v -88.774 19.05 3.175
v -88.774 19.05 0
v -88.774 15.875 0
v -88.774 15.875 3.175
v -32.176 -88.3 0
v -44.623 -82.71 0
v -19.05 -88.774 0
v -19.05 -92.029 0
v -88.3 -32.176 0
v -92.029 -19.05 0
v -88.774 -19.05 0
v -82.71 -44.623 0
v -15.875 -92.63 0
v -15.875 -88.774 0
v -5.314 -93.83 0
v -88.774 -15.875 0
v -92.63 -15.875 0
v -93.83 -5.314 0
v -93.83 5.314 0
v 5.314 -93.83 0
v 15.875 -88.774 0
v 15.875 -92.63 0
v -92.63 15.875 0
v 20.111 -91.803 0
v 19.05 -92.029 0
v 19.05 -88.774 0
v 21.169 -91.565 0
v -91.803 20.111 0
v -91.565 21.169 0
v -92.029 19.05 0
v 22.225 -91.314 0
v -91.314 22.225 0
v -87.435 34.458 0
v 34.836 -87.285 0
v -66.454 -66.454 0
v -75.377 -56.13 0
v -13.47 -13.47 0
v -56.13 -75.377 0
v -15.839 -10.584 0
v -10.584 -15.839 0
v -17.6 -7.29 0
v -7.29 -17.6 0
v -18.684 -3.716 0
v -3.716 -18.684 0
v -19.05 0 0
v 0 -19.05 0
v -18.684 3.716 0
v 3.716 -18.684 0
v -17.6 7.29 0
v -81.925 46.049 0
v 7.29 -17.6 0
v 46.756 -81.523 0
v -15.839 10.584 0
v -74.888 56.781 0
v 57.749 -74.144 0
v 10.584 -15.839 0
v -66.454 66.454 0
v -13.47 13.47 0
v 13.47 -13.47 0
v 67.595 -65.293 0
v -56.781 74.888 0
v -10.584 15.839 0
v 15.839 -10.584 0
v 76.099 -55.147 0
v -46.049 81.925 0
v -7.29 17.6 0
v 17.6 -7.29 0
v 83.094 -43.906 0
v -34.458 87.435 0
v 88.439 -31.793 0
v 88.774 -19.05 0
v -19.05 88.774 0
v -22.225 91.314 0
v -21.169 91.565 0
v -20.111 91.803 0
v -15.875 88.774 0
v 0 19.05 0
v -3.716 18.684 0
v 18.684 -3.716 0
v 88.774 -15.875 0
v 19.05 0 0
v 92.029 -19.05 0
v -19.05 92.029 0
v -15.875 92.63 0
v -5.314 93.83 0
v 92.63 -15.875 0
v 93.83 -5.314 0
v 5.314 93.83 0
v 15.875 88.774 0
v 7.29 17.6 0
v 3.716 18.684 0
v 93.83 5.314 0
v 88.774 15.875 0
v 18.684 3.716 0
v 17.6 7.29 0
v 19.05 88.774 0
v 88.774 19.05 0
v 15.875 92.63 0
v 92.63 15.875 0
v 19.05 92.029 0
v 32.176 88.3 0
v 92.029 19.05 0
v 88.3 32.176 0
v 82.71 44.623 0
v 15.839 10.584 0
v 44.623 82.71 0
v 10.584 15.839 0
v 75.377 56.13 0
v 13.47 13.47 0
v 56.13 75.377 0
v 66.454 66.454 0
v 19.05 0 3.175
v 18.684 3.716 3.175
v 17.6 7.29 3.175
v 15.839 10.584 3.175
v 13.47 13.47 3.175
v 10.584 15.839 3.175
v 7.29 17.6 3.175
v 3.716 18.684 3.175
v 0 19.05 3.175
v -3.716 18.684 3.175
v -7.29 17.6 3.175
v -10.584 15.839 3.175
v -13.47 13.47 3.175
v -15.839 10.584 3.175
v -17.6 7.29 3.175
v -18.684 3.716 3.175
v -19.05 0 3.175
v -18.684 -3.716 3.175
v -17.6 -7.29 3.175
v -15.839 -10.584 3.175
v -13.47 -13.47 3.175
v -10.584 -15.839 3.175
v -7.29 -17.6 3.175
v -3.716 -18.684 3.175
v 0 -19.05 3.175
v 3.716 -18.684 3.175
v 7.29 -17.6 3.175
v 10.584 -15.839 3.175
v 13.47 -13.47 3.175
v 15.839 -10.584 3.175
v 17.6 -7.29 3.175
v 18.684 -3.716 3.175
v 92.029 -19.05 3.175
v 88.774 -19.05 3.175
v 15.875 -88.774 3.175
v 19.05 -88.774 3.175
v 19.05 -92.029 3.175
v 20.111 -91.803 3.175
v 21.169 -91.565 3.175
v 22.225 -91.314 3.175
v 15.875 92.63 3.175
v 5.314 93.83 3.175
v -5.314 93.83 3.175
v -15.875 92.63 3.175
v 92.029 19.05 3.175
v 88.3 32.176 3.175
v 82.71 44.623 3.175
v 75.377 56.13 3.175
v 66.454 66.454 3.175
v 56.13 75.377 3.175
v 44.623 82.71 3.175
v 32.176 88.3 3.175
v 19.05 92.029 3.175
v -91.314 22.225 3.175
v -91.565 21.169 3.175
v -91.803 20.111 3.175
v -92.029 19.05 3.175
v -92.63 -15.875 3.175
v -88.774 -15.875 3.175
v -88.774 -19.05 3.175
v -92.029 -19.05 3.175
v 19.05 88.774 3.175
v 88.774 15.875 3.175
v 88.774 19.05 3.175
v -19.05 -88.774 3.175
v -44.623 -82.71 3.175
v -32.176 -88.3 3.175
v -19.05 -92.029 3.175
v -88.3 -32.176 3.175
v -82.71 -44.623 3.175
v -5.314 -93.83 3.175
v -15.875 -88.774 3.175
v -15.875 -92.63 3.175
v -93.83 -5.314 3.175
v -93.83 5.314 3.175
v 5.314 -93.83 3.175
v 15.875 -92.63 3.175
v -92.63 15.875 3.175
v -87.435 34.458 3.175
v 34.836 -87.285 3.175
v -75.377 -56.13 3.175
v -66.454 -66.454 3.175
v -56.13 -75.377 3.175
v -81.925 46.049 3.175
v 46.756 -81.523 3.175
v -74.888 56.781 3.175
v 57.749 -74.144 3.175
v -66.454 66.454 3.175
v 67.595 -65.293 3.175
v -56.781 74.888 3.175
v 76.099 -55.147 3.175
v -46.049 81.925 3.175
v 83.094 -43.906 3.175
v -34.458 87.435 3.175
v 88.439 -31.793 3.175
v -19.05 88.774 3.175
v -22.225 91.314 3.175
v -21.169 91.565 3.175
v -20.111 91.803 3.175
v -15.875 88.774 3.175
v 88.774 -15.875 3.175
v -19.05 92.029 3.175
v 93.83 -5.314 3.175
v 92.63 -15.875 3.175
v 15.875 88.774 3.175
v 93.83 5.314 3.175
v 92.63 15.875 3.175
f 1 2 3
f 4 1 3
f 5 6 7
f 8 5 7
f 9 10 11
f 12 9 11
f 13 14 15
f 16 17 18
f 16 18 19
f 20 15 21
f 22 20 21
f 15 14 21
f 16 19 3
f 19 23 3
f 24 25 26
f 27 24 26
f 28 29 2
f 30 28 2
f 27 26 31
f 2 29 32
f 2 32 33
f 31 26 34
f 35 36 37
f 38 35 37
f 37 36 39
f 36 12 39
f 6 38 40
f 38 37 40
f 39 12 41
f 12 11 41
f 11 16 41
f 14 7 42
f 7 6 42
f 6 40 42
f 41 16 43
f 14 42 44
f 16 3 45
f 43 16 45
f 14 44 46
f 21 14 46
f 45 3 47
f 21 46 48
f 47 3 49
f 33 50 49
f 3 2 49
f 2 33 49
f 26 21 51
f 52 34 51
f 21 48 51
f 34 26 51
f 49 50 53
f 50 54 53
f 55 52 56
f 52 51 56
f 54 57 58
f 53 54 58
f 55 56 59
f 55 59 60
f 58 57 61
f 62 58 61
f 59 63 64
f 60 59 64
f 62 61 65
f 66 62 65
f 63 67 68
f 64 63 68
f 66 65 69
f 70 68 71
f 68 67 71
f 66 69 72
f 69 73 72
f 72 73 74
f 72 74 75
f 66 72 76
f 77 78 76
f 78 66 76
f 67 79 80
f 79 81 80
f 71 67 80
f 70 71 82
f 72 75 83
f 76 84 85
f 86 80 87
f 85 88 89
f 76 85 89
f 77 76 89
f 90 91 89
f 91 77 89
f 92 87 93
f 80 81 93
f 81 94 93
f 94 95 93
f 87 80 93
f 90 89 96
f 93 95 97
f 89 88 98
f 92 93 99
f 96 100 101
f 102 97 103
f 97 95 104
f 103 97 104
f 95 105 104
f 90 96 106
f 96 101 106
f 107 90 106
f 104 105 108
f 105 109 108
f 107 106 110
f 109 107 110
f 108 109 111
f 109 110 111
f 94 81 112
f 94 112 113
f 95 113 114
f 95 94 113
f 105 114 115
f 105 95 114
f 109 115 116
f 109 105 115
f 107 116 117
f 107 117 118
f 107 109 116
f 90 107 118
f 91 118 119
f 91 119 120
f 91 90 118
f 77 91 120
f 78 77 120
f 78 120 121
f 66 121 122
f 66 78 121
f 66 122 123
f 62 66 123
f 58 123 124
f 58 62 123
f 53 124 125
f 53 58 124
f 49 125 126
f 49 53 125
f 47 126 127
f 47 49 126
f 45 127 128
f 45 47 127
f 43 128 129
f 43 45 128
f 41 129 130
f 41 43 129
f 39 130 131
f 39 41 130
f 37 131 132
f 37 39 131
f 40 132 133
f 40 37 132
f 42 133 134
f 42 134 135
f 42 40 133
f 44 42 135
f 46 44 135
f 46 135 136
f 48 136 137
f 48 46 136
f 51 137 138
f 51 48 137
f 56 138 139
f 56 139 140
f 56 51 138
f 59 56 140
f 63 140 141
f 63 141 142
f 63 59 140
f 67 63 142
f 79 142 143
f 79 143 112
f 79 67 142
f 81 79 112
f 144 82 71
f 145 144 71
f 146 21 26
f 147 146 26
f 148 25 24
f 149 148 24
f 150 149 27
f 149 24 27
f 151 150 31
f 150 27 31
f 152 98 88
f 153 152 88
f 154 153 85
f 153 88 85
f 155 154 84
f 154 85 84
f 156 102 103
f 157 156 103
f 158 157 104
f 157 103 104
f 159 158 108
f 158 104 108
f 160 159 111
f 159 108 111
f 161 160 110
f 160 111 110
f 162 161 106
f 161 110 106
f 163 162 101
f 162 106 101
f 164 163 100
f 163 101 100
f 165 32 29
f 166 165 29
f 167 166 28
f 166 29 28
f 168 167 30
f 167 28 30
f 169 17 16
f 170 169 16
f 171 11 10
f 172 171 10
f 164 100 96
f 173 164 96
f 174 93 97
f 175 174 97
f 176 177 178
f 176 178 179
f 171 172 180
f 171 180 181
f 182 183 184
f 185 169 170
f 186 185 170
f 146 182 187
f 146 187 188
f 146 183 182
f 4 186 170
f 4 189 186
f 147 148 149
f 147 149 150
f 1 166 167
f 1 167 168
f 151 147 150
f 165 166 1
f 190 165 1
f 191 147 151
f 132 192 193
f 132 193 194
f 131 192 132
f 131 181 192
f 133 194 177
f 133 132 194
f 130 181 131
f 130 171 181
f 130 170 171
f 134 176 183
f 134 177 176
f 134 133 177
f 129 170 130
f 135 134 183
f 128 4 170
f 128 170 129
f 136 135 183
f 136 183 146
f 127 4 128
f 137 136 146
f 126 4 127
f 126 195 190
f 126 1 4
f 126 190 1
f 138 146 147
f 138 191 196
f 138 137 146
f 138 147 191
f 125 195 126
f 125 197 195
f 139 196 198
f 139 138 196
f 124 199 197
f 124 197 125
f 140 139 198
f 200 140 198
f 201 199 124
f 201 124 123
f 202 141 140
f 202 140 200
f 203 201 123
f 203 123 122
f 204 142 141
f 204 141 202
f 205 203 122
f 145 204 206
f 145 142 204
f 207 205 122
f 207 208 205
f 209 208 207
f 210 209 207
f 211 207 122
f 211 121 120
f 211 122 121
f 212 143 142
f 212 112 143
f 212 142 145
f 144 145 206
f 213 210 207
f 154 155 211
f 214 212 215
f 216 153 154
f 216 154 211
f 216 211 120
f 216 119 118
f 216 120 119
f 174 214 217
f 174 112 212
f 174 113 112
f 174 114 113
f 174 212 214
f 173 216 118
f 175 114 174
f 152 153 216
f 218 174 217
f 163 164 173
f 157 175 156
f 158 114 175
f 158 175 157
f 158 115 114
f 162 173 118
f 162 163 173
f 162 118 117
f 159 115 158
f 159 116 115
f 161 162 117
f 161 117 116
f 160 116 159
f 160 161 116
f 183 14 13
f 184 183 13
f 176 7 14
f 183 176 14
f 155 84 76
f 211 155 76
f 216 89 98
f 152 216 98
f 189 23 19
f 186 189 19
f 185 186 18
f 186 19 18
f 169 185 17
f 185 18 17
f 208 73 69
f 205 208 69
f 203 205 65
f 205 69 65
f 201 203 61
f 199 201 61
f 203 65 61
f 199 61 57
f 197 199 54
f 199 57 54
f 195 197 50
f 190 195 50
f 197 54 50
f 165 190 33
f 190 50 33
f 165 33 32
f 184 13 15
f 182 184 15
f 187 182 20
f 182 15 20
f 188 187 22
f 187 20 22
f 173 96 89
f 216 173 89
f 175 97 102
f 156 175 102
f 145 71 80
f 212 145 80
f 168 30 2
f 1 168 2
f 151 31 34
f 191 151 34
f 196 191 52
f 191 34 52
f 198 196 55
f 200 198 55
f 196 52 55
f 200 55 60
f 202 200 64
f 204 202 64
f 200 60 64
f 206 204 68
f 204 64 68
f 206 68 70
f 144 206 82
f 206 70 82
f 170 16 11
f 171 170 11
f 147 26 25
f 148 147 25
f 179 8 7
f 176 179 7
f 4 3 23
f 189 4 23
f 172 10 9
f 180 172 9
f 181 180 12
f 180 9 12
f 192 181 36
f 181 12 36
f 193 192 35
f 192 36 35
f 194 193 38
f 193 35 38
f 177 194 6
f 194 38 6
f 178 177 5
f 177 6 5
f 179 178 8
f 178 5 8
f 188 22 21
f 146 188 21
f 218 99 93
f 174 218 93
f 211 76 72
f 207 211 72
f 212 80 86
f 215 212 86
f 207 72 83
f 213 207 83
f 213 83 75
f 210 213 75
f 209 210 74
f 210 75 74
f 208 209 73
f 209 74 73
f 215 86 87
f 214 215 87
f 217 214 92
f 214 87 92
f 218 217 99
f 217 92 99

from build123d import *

# Parameters (mm, degrees)
SKETCH1_R           = 19.05
BOSS_EXTRUDE1_DEPTH = 3.175


with BuildPart() as part:
    # Sketch1 → Boss-Extrude1 (new body)
    with BuildSketch(Plane.XY):
        with BuildLine():
            Line((-19.05, -92.029005754), (-19.05, -88.774236431))
            Line((-19.05, -88.774236431), (-15.875, -88.774236431))
            Line((-15.875, -88.774236431), (-15.875, -92.629502725))
            ThreePointArc((-15.875, -92.629502725), (0, -93.98), (15.875, -92.629502725))
            Line((15.875, -92.629502725), (15.875, -88.774236431))
            Line((15.875, -88.774236431), (19.05, -88.774236431))
            Line((19.05, -88.774236431), (19.05, -92.029005754))
            ThreePointArc((19.05, -92.029005754), (20.640594227, -91.685365626), (22.225, -91.314236431))
            ThreePointArc((22.225, -91.314236431), (67.594559133, -65.29330728), (92.029005754, -19.05))
            Line((92.029005754, -19.05), (88.774236431, -19.05))
            Line((88.774236431, -19.05), (88.774236431, -15.875))
            Line((88.774236431, -15.875), (92.629502725, -15.875))
            ThreePointArc((92.629502725, -15.875), (93.98, 0), (92.629502725, 15.875))
            Line((92.629502725, 15.875), (88.774236431, 15.875))
            Line((88.774236431, 15.875), (88.774236431, 19.05))
            Line((88.774236431, 19.05), (92.029005754, 19.05))
            ThreePointArc((92.029005754, 19.05), (66.453895296, 66.453895296), (19.05, 92.029005754))
            Line((19.05, 92.029005754), (19.05, 88.774236431))
            Line((19.05, 88.774236431), (15.875, 88.774236431))
            Line((15.875, 88.774236431), (15.875, 92.629502725))
            ThreePointArc((15.875, 92.629502725), (0, 93.98), (-15.875, 92.629502725))
            Line((-15.875, 92.629502725), (-15.875, 88.774236431))
            Line((-15.875, 88.774236431), (-19.05, 88.774236431))
            Line((-19.05, 88.774236431), (-19.05, 92.029005754))
            ThreePointArc((-19.05, 92.029005754), (-20.640594227, 91.685365626), (-22.225, 91.314236431))
            ThreePointArc((-22.225, 91.314236431), (-66.453895296, 66.453895296), (-91.314236431, 22.225))
            ThreePointArc((-91.314236431, 22.225), (-91.685365626, 20.640594227), (-92.029005754, 19.05))
            Line((-92.029005754, 19.05), (-88.774236431, 19.05))
            Line((-88.774236431, 19.05), (-88.774236431, 15.875))
            Line((-88.774236431, 15.875), (-92.629502725, 15.875))
            ThreePointArc((-92.629502725, 15.875), (-93.98, 0), (-92.629502725, -15.875))
            Line((-92.629502725, -15.875), (-88.774236431, -15.875))
            Line((-88.774236431, -15.875), (-88.774236431, -19.05))
            Line((-88.774236431, -19.05), (-92.029005754, -19.05))
            ThreePointArc((-92.029005754, -19.05), (-66.453895296, -66.453895296), (-19.05, -92.029005754))
        make_face()
        Circle(SKETCH1_R, mode=Mode.SUBTRACT)
    extrude(amount=BOSS_EXTRUDE1_DEPTH)


solid = part.part
